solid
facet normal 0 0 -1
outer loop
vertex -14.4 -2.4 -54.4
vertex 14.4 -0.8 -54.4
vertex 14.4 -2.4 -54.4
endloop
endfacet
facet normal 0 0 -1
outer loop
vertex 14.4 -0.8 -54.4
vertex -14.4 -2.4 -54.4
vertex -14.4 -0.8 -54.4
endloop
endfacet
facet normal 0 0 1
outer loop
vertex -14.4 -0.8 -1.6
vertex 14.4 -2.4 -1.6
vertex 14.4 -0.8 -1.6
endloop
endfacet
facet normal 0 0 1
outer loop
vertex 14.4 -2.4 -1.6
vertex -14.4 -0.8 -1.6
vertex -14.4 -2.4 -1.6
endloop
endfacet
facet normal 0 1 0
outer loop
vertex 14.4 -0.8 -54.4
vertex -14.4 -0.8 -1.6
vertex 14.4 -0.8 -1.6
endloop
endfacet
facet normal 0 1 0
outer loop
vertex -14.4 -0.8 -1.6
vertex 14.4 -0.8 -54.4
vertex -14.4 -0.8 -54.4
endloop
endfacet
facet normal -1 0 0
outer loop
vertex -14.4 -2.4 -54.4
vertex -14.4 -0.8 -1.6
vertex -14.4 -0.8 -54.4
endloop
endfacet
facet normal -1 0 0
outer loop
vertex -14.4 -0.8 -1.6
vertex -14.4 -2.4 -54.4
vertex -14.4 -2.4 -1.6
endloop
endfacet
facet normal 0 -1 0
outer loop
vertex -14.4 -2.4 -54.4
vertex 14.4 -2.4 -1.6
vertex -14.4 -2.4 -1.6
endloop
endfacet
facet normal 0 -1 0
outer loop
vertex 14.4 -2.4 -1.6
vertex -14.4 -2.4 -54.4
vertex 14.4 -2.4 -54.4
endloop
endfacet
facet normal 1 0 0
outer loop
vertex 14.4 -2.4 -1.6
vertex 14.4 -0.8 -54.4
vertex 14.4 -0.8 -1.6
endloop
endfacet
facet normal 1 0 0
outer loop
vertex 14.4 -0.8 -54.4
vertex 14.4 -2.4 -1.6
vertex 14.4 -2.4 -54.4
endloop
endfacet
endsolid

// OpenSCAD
// file: ../p/box.scad
use <../lib.scad>
function ldraw_lib__box() = [
// 0 Box 6 (six faces)
// 0 Name: box.dat
// 0 Author: James Jessiman
// 0 !LDRAW_ORG Primitive UPDATE 2002-05
// 0 !LICENSE Licensed under CC BY 4.0 : see CAreadme.txt
// 
// 0 BFC CERTIFY CCW
  [0,"BFC","CERTIFY"],
  [0,"BFC","CCW"],
// 
// 0 !HISTORY 2002-08-22 [sbliss] Applied BFC
// 0 !HISTORY 2002-11-30 [PTadmin] Official Update 2002-05
// 0 !HISTORY 2007-06-24 [PTadmin] Header formatted for Contributor Agreement
// 0 !HISTORY 2008-07-01 [PTadmin] Official Update 2008-01
// 
// 
// 2 24 1 1 1 -1 1 1
  [2,24,1,1,1,-1,1,1],
// 2 24 -1 1 1 -1 1 -1
  [2,24,-1,1,1,-1,1,-1],
// 2 24 -1 1 -1 1 1 -1
  [2,24,-1,1,-1,1,1,-1],
// 2 24 1 1 -1 1 1 1
  [2,24,1,1,-1,1,1,1],
// 2 24 1 -1 1 -1 -1 1
  [2,24,1,-1,1,-1,-1,1],
// 2 24 -1 -1 1 -1 -1 -1
  [2,24,-1,-1,1,-1,-1,-1],
// 2 24 -1 -1 -1 1 -1 -1
  [2,24,-1,-1,-1,1,-1,-1],
// 2 24 1 -1 -1 1 -1 1
  [2,24,1,-1,-1,1,-1,1],
// 2 24 1 -1 1 1 1 1
  [2,24,1,-1,1,1,1,1],
// 2 24 -1 -1 1 -1 1 1
  [2,24,-1,-1,1,-1,1,1],
// 2 24 1 -1 -1 1 1 -1
  [2,24,1,-1,-1,1,1,-1],
// 2 24 -1 -1 -1 -1 1 -1
  [2,24,-1,-1,-1,-1,1,-1],
// 4 16 1 1 1 1 1 -1 -1 1 -1 -1 1 1
  [4,16,1,1,1,1,1,-1,-1,1,-1,-1,1,1],
// 4 16 -1 -1 -1 1 -1 -1 1 -1 1 -1 -1 1
  [4,16,-1,-1,-1,1,-1,-1,1,-1,1,-1,-1,1],
// 4 16 -1 -1 1 1 -1 1 1 1 1 -1 1 1
  [4,16,-1,-1,1,1,-1,1,1,1,1,-1,1,1],
// 4 16 -1 -1 -1 -1 -1 1 -1 1 1 -1 1 -1
  [4,16,-1,-1,-1,-1,-1,1,-1,1,1,-1,1,-1],
// 4 16 1 -1 -1 -1 -1 -1 -1 1 -1 1 1 -1
  [4,16,1,-1,-1,-1,-1,-1,-1,1,-1,1,1,-1],
// 4 16 1 -1 1 1 -1 -1 1 1 -1 1 1 1
  [4,16,1,-1,1,1,-1,-1,1,1,-1,1,1,1],
// 0
];
module ldraw_lib__box(step=0, col=false, unit=2/5, alt=false, line=0.2, solid=!$preview)
    makepoly(ldraw_lib__box(), step=step, col=col, unit=unit, alt=alt, line=line, solid=solid);
ldraw_lib__box(line=0.2);
// main file
use <../lib.scad>
use <../p/box.scad>
function ldraw_lib__6202() = [
// 0 ~Glass for Window  1 x  4 x  6
// 0 Name: 6202.dat
// 0 Author: James Jessiman
// 0 !LDRAW_ORG Part UPDATE 2012-03
// 0 !LICENSE Licensed under CC BY 4.0 : see CAreadme.txt
// 
// 0 BFC CERTIFY CCW
  [0,"BFC","CERTIFY"],
  [0,"BFC","CCW"],
// 
// 0 !HISTORY 1999-02-01 [PTadmin] Official Update 1999-01
// 0 !HISTORY 2007-07-16 [PTadmin] Header formatted for Contributor Agreement
// 0 !HISTORY 2008-07-01 [PTadmin] Official Update 2008-01
// 0 !HISTORY 2009-04-28 [PTadmin] Renamed from 6160b
// 0 !HISTORY 2012-11-14 [mikeheide] BFC'ed
// 0 !HISTORY 2012-12-28 [PTadmin] Official Update 2012-03
// 
// 
// 1 16 0 70 -4 36 0 0 0 66 0 0 0 2 box.dat
  [1,16,0,70,-4,36,0,0,0,66,0,0,0,2, ldraw_lib__box()],
];
module ldraw_lib__6202(step=0, col=false, unit=2/5, alt=false, line=0.2, solid=!$preview)
    makepoly(ldraw_lib__6202(), step=step, col=col, unit=unit, alt=alt, line=line, solid=solid);
ldraw_lib__6202(line=0.2);
